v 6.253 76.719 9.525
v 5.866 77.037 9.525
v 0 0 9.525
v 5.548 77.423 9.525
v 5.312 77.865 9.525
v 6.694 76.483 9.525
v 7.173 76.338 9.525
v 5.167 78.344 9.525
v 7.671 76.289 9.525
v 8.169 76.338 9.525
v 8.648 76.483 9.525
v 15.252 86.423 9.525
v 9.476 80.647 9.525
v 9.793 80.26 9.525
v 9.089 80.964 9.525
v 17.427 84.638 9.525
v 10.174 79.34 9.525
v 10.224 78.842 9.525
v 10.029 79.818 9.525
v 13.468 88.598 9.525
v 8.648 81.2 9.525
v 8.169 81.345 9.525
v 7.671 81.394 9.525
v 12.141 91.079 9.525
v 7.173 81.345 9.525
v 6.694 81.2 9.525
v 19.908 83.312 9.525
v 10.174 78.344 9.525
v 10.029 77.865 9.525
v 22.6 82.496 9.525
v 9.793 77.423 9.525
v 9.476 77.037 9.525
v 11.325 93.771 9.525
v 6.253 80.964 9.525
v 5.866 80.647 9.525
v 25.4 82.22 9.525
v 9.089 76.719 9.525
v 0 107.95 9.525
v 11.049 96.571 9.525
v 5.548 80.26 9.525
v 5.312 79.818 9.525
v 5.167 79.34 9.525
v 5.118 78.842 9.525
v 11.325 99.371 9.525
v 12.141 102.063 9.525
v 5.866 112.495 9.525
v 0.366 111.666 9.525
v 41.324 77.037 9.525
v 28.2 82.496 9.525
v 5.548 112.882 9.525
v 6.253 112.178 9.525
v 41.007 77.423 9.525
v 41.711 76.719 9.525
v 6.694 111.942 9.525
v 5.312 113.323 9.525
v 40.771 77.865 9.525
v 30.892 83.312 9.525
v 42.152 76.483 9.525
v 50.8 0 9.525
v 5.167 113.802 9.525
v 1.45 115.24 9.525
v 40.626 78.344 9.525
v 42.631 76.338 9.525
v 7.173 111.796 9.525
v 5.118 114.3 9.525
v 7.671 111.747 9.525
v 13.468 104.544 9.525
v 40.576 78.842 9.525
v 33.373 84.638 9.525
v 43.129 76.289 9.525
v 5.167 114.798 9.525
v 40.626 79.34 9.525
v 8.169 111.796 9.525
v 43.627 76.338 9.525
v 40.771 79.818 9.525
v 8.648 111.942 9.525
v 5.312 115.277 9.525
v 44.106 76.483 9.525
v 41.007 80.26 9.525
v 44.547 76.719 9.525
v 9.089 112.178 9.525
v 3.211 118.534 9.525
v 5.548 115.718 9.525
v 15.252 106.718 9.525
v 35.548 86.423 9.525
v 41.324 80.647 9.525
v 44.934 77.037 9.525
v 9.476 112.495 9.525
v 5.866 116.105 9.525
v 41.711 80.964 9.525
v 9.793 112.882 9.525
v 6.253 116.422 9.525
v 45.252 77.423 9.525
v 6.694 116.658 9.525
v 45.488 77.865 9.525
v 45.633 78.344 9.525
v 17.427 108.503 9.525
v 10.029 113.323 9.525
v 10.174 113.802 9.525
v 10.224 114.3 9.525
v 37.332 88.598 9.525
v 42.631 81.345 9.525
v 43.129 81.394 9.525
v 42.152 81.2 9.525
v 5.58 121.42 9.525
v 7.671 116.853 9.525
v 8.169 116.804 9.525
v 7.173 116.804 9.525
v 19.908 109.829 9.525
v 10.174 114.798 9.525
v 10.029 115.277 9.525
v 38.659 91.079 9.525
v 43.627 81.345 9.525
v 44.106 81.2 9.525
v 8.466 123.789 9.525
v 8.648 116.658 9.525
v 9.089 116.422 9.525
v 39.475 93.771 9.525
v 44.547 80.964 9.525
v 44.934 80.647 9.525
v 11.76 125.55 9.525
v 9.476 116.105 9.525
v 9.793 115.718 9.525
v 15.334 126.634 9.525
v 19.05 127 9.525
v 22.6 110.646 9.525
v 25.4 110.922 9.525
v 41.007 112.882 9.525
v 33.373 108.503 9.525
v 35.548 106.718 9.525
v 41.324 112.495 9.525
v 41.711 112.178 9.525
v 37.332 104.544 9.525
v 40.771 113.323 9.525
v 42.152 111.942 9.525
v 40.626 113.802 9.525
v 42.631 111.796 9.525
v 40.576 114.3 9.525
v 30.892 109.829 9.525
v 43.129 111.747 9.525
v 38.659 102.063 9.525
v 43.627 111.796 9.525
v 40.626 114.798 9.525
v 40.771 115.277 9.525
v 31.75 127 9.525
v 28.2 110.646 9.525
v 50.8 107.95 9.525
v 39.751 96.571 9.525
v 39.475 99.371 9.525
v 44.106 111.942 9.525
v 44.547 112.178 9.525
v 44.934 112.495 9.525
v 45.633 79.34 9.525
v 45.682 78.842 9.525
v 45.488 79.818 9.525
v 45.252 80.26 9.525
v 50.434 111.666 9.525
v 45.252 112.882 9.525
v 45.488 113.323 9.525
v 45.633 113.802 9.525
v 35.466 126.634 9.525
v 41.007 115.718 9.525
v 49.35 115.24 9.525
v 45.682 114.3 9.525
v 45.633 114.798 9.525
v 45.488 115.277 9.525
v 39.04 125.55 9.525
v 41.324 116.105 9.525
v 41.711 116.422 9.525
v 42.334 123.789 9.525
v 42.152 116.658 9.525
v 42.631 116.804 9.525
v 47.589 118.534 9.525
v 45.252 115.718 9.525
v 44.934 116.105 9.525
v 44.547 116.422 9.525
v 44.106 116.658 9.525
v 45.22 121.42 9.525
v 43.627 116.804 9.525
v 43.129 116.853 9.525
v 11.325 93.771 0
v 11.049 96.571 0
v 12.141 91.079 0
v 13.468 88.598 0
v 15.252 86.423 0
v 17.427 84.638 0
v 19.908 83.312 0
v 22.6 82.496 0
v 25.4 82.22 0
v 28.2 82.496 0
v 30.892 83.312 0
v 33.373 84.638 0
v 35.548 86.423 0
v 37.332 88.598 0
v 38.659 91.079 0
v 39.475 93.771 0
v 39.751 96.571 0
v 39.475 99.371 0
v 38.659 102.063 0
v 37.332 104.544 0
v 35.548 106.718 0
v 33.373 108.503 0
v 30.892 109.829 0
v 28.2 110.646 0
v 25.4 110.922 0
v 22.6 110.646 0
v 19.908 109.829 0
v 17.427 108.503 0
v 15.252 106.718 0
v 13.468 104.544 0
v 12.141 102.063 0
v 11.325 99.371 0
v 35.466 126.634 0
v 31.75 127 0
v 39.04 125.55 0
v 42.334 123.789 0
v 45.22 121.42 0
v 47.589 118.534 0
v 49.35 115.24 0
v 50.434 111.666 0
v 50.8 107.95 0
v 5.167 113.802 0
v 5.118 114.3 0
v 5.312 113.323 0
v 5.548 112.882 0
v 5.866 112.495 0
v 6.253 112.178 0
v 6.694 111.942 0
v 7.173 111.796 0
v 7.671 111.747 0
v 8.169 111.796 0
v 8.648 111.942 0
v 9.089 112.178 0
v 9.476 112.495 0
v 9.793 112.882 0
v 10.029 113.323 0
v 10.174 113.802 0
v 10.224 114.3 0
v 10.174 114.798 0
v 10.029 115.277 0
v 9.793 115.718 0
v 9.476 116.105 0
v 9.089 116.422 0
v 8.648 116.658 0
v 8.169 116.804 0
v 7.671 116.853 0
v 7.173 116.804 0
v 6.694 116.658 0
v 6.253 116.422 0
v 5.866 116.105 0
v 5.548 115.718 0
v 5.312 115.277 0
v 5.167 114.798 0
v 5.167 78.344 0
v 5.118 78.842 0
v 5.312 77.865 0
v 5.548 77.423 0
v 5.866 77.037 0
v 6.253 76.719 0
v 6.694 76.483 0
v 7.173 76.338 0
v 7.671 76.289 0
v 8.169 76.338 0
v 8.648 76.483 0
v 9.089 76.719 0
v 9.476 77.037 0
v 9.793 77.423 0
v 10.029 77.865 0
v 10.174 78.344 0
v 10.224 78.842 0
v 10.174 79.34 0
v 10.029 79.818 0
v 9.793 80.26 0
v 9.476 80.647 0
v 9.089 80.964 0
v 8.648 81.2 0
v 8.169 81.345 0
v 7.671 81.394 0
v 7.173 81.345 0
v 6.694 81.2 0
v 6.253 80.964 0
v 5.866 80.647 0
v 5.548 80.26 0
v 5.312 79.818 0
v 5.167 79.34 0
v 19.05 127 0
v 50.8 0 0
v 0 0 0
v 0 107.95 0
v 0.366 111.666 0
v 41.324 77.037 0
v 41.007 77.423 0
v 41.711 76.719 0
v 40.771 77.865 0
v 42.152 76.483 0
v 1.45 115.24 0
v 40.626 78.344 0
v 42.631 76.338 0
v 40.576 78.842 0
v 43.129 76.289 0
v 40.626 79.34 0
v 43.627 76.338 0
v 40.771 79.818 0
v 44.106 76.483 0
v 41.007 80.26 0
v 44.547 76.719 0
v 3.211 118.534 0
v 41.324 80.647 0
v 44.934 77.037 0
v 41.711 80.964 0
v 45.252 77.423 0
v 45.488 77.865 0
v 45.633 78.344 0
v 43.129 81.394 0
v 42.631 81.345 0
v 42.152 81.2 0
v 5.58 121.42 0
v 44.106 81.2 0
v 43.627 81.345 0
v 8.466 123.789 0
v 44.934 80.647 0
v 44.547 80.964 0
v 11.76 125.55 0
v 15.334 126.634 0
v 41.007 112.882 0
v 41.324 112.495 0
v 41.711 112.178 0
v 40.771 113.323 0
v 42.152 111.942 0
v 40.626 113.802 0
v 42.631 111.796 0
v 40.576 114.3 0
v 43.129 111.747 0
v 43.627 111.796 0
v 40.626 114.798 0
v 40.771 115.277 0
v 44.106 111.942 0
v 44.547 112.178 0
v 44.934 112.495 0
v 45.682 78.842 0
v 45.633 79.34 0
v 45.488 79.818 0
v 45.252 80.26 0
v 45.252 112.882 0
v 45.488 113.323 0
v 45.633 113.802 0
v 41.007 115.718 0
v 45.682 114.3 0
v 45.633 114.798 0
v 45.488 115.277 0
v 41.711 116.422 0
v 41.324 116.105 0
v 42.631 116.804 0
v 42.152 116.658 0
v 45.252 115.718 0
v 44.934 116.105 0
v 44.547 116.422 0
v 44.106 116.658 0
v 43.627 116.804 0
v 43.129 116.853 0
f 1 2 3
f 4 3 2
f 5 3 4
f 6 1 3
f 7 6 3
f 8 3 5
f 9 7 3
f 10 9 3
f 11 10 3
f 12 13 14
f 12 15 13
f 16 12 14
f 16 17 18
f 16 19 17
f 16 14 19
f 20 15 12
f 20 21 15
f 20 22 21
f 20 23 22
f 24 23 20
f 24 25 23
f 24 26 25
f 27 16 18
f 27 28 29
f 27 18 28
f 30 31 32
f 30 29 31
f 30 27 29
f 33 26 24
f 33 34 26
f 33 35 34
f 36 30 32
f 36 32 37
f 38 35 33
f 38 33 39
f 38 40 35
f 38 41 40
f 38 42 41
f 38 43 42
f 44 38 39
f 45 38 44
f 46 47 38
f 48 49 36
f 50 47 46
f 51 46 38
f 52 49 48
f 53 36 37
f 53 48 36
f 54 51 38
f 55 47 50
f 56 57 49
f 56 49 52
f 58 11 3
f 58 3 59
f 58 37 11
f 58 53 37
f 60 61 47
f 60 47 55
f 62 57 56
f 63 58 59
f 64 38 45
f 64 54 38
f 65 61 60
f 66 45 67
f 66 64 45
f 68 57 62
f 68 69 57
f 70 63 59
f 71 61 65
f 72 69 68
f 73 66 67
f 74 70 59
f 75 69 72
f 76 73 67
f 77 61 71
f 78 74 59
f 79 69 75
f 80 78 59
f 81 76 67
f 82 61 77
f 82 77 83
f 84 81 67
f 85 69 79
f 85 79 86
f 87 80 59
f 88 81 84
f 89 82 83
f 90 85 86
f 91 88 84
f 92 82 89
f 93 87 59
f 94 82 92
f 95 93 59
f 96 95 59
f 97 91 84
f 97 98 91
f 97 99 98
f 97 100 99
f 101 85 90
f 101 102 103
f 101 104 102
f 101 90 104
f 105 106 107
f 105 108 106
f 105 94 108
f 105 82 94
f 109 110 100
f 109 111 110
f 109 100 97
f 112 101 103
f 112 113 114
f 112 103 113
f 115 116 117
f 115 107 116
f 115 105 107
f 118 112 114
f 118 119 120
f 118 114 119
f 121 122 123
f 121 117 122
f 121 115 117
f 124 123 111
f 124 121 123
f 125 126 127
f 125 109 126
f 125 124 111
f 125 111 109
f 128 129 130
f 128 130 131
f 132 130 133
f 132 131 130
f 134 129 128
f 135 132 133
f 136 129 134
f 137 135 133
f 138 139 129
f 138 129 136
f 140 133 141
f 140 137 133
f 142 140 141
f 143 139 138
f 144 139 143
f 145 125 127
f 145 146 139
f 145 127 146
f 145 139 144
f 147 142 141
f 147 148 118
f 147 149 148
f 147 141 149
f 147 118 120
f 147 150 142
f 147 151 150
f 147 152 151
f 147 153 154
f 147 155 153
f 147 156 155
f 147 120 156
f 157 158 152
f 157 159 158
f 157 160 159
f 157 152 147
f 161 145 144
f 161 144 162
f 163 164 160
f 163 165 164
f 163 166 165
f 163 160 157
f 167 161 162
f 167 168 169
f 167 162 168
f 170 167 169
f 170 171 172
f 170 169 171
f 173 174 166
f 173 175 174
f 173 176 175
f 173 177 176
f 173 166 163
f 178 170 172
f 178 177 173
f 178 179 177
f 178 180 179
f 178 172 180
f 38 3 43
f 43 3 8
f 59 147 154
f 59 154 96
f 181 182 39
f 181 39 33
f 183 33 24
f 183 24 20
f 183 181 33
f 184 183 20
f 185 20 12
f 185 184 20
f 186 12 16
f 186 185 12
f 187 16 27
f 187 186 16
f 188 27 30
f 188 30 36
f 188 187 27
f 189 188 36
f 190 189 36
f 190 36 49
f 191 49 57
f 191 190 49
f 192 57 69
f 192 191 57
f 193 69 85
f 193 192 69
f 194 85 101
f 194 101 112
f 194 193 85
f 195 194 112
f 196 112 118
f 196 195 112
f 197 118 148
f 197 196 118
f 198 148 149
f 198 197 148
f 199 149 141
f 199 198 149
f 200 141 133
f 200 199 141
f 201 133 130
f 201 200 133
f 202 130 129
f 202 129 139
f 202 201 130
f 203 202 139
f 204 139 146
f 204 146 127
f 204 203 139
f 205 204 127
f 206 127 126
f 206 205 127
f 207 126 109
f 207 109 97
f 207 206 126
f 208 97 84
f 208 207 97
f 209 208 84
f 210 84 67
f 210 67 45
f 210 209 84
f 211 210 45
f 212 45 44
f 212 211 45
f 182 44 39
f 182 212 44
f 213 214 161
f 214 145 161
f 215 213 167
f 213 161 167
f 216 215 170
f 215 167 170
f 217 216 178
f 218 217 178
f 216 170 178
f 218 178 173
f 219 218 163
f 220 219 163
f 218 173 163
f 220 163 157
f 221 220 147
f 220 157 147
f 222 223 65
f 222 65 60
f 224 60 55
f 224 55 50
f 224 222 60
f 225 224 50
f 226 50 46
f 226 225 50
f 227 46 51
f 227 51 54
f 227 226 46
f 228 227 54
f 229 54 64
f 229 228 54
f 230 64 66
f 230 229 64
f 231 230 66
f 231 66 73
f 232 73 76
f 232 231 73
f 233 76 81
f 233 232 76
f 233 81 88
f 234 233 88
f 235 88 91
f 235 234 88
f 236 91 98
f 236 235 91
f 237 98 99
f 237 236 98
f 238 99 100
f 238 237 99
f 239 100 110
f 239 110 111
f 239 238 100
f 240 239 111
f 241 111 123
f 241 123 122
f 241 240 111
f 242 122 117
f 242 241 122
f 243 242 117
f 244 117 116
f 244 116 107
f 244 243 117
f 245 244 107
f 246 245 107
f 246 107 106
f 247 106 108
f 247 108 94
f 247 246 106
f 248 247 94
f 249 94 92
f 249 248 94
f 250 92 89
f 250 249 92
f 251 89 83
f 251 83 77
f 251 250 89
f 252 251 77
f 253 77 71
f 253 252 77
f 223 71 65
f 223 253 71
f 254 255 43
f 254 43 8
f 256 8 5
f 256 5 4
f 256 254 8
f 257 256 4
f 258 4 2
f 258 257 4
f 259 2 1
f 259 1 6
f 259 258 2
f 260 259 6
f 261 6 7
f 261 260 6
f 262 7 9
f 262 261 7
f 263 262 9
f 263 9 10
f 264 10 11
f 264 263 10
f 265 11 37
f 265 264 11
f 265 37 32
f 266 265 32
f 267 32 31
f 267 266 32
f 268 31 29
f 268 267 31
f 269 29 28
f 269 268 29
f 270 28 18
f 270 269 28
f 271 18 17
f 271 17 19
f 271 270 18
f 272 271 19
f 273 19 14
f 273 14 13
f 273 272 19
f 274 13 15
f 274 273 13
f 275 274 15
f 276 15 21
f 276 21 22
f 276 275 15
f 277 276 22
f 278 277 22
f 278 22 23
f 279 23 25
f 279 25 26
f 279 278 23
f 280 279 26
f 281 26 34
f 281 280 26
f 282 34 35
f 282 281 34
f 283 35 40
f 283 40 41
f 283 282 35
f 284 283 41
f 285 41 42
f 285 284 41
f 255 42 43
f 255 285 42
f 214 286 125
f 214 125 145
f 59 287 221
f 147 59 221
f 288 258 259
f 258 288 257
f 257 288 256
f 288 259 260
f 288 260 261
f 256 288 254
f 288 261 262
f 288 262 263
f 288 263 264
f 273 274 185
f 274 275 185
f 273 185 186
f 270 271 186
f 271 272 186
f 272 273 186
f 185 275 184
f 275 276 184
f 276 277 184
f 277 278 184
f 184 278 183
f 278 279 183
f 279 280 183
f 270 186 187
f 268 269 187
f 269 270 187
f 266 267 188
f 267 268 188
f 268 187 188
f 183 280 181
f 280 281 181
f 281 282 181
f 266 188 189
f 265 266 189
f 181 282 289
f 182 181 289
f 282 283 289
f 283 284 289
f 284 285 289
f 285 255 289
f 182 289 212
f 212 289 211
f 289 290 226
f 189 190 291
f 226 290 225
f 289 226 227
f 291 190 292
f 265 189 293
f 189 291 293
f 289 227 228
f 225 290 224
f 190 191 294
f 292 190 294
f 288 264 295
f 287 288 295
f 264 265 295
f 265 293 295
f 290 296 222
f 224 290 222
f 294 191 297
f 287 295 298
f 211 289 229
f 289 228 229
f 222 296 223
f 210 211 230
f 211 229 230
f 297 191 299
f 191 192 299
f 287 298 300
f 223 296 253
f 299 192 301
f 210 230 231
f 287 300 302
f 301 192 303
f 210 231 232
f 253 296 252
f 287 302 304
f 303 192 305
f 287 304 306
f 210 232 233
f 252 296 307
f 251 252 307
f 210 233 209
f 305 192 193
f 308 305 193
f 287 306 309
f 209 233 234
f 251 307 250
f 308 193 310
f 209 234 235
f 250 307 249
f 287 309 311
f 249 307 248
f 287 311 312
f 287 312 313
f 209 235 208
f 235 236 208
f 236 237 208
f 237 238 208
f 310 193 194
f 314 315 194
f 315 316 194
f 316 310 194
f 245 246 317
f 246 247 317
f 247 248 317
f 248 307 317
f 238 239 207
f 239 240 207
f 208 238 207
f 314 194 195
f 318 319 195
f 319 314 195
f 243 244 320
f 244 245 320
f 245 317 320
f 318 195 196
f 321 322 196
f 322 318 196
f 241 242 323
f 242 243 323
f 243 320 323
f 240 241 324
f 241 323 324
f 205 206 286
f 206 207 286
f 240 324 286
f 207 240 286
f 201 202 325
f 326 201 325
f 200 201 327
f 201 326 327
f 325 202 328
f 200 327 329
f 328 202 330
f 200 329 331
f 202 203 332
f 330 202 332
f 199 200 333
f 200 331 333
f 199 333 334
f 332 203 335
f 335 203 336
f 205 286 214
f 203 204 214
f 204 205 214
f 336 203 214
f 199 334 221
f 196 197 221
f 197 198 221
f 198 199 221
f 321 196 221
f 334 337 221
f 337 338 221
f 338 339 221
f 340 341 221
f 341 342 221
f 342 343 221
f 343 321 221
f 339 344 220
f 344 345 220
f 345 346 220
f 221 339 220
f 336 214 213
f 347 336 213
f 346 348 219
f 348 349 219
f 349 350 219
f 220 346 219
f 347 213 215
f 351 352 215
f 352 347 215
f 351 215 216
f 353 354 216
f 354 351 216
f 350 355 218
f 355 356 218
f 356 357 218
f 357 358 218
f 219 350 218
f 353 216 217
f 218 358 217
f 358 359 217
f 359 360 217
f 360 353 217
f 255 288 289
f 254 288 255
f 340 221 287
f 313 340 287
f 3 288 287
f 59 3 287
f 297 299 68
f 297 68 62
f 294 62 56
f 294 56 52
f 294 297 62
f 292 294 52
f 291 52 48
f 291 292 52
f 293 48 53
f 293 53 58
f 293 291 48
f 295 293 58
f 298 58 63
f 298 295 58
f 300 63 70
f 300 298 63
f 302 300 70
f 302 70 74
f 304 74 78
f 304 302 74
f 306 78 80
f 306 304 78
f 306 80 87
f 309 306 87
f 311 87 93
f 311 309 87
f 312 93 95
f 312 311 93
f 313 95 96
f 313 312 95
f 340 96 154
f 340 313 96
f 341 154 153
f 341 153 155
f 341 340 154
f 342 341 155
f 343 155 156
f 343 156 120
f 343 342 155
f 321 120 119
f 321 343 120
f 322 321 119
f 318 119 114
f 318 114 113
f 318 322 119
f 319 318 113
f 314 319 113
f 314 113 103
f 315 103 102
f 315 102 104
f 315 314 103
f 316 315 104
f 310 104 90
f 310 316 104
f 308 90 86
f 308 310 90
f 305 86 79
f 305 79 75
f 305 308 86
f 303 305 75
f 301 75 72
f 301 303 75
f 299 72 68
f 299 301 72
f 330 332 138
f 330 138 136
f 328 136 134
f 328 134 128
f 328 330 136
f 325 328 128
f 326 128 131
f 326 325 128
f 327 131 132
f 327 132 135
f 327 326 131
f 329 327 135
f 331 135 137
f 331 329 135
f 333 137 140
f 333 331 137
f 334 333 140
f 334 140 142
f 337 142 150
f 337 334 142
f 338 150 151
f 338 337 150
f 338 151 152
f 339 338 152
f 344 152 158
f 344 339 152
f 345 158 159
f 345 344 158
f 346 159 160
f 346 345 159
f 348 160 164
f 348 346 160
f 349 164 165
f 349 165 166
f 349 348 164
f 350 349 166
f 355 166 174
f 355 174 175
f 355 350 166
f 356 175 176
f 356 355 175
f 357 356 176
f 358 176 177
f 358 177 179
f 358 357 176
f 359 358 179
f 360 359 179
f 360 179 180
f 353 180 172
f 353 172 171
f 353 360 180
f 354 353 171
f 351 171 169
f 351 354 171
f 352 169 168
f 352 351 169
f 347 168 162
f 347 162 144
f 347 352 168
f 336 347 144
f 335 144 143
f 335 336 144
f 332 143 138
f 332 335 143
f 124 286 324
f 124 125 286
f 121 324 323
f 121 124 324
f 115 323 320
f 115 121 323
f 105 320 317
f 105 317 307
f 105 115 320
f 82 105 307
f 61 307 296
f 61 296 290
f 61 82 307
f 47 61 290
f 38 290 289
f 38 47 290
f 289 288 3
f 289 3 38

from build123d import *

# Parameters (mm, degrees)
SKETCH2_W           = 50.8
SKETCH2_H           = 127
SKETCH2_R           = 14.351
SKETCH2_R_2         = 2.5527
BOSS_EXTRUDE3_DEPTH = 9.525
FILLET1_R           = 19.05
FILLET4_R           = 19.05


with BuildPart() as part:
    # Sketch2 → Boss-Extrude3 (new body)
    with BuildSketch(Plane.XY):
        with Locations((25.4, 63.5)):
            Rectangle(SKETCH2_W, SKETCH2_H)
        with Locations(Location((25.4, 96.5708, 0), (0, 0, 180))):
            Circle(SKETCH2_R, mode=Mode.SUBTRACT)
        with Locations(Location((43.1292, 114.3, 0), (0, 0, 180))):
            Circle(SKETCH2_R_2, mode=Mode.SUBTRACT)
        with Locations(Location((7.6708, 114.3, 0), (0, 0, 180))):
            Circle(SKETCH2_R_2, mode=Mode.SUBTRACT)
        with Locations(Location((7.6708, 78.8416, 0), (0, 0, 180))):
            Circle(SKETCH2_R_2, mode=Mode.SUBTRACT)
        with Locations(Location((43.1292, 78.8416, 0), (0, 0, 180))):
            Circle(SKETCH2_R_2, mode=Mode.SUBTRACT)
    extrude(amount=BOSS_EXTRUDE3_DEPTH)

    # Fillet1
    fillet1_edges = [part.edges().sort_by_distance(p)[0] for p in [
        (50.8, 127, 4.7625),
    ]]
    fillet(fillet1_edges, radius=FILLET1_R)

    # Fillet4
    fillet4_edges = [part.edges().sort_by_distance(p)[0] for p in [
        (0, 127, 4.7625),
    ]]
    fillet(fillet4_edges, radius=FILLET4_R)


solid = part.part
